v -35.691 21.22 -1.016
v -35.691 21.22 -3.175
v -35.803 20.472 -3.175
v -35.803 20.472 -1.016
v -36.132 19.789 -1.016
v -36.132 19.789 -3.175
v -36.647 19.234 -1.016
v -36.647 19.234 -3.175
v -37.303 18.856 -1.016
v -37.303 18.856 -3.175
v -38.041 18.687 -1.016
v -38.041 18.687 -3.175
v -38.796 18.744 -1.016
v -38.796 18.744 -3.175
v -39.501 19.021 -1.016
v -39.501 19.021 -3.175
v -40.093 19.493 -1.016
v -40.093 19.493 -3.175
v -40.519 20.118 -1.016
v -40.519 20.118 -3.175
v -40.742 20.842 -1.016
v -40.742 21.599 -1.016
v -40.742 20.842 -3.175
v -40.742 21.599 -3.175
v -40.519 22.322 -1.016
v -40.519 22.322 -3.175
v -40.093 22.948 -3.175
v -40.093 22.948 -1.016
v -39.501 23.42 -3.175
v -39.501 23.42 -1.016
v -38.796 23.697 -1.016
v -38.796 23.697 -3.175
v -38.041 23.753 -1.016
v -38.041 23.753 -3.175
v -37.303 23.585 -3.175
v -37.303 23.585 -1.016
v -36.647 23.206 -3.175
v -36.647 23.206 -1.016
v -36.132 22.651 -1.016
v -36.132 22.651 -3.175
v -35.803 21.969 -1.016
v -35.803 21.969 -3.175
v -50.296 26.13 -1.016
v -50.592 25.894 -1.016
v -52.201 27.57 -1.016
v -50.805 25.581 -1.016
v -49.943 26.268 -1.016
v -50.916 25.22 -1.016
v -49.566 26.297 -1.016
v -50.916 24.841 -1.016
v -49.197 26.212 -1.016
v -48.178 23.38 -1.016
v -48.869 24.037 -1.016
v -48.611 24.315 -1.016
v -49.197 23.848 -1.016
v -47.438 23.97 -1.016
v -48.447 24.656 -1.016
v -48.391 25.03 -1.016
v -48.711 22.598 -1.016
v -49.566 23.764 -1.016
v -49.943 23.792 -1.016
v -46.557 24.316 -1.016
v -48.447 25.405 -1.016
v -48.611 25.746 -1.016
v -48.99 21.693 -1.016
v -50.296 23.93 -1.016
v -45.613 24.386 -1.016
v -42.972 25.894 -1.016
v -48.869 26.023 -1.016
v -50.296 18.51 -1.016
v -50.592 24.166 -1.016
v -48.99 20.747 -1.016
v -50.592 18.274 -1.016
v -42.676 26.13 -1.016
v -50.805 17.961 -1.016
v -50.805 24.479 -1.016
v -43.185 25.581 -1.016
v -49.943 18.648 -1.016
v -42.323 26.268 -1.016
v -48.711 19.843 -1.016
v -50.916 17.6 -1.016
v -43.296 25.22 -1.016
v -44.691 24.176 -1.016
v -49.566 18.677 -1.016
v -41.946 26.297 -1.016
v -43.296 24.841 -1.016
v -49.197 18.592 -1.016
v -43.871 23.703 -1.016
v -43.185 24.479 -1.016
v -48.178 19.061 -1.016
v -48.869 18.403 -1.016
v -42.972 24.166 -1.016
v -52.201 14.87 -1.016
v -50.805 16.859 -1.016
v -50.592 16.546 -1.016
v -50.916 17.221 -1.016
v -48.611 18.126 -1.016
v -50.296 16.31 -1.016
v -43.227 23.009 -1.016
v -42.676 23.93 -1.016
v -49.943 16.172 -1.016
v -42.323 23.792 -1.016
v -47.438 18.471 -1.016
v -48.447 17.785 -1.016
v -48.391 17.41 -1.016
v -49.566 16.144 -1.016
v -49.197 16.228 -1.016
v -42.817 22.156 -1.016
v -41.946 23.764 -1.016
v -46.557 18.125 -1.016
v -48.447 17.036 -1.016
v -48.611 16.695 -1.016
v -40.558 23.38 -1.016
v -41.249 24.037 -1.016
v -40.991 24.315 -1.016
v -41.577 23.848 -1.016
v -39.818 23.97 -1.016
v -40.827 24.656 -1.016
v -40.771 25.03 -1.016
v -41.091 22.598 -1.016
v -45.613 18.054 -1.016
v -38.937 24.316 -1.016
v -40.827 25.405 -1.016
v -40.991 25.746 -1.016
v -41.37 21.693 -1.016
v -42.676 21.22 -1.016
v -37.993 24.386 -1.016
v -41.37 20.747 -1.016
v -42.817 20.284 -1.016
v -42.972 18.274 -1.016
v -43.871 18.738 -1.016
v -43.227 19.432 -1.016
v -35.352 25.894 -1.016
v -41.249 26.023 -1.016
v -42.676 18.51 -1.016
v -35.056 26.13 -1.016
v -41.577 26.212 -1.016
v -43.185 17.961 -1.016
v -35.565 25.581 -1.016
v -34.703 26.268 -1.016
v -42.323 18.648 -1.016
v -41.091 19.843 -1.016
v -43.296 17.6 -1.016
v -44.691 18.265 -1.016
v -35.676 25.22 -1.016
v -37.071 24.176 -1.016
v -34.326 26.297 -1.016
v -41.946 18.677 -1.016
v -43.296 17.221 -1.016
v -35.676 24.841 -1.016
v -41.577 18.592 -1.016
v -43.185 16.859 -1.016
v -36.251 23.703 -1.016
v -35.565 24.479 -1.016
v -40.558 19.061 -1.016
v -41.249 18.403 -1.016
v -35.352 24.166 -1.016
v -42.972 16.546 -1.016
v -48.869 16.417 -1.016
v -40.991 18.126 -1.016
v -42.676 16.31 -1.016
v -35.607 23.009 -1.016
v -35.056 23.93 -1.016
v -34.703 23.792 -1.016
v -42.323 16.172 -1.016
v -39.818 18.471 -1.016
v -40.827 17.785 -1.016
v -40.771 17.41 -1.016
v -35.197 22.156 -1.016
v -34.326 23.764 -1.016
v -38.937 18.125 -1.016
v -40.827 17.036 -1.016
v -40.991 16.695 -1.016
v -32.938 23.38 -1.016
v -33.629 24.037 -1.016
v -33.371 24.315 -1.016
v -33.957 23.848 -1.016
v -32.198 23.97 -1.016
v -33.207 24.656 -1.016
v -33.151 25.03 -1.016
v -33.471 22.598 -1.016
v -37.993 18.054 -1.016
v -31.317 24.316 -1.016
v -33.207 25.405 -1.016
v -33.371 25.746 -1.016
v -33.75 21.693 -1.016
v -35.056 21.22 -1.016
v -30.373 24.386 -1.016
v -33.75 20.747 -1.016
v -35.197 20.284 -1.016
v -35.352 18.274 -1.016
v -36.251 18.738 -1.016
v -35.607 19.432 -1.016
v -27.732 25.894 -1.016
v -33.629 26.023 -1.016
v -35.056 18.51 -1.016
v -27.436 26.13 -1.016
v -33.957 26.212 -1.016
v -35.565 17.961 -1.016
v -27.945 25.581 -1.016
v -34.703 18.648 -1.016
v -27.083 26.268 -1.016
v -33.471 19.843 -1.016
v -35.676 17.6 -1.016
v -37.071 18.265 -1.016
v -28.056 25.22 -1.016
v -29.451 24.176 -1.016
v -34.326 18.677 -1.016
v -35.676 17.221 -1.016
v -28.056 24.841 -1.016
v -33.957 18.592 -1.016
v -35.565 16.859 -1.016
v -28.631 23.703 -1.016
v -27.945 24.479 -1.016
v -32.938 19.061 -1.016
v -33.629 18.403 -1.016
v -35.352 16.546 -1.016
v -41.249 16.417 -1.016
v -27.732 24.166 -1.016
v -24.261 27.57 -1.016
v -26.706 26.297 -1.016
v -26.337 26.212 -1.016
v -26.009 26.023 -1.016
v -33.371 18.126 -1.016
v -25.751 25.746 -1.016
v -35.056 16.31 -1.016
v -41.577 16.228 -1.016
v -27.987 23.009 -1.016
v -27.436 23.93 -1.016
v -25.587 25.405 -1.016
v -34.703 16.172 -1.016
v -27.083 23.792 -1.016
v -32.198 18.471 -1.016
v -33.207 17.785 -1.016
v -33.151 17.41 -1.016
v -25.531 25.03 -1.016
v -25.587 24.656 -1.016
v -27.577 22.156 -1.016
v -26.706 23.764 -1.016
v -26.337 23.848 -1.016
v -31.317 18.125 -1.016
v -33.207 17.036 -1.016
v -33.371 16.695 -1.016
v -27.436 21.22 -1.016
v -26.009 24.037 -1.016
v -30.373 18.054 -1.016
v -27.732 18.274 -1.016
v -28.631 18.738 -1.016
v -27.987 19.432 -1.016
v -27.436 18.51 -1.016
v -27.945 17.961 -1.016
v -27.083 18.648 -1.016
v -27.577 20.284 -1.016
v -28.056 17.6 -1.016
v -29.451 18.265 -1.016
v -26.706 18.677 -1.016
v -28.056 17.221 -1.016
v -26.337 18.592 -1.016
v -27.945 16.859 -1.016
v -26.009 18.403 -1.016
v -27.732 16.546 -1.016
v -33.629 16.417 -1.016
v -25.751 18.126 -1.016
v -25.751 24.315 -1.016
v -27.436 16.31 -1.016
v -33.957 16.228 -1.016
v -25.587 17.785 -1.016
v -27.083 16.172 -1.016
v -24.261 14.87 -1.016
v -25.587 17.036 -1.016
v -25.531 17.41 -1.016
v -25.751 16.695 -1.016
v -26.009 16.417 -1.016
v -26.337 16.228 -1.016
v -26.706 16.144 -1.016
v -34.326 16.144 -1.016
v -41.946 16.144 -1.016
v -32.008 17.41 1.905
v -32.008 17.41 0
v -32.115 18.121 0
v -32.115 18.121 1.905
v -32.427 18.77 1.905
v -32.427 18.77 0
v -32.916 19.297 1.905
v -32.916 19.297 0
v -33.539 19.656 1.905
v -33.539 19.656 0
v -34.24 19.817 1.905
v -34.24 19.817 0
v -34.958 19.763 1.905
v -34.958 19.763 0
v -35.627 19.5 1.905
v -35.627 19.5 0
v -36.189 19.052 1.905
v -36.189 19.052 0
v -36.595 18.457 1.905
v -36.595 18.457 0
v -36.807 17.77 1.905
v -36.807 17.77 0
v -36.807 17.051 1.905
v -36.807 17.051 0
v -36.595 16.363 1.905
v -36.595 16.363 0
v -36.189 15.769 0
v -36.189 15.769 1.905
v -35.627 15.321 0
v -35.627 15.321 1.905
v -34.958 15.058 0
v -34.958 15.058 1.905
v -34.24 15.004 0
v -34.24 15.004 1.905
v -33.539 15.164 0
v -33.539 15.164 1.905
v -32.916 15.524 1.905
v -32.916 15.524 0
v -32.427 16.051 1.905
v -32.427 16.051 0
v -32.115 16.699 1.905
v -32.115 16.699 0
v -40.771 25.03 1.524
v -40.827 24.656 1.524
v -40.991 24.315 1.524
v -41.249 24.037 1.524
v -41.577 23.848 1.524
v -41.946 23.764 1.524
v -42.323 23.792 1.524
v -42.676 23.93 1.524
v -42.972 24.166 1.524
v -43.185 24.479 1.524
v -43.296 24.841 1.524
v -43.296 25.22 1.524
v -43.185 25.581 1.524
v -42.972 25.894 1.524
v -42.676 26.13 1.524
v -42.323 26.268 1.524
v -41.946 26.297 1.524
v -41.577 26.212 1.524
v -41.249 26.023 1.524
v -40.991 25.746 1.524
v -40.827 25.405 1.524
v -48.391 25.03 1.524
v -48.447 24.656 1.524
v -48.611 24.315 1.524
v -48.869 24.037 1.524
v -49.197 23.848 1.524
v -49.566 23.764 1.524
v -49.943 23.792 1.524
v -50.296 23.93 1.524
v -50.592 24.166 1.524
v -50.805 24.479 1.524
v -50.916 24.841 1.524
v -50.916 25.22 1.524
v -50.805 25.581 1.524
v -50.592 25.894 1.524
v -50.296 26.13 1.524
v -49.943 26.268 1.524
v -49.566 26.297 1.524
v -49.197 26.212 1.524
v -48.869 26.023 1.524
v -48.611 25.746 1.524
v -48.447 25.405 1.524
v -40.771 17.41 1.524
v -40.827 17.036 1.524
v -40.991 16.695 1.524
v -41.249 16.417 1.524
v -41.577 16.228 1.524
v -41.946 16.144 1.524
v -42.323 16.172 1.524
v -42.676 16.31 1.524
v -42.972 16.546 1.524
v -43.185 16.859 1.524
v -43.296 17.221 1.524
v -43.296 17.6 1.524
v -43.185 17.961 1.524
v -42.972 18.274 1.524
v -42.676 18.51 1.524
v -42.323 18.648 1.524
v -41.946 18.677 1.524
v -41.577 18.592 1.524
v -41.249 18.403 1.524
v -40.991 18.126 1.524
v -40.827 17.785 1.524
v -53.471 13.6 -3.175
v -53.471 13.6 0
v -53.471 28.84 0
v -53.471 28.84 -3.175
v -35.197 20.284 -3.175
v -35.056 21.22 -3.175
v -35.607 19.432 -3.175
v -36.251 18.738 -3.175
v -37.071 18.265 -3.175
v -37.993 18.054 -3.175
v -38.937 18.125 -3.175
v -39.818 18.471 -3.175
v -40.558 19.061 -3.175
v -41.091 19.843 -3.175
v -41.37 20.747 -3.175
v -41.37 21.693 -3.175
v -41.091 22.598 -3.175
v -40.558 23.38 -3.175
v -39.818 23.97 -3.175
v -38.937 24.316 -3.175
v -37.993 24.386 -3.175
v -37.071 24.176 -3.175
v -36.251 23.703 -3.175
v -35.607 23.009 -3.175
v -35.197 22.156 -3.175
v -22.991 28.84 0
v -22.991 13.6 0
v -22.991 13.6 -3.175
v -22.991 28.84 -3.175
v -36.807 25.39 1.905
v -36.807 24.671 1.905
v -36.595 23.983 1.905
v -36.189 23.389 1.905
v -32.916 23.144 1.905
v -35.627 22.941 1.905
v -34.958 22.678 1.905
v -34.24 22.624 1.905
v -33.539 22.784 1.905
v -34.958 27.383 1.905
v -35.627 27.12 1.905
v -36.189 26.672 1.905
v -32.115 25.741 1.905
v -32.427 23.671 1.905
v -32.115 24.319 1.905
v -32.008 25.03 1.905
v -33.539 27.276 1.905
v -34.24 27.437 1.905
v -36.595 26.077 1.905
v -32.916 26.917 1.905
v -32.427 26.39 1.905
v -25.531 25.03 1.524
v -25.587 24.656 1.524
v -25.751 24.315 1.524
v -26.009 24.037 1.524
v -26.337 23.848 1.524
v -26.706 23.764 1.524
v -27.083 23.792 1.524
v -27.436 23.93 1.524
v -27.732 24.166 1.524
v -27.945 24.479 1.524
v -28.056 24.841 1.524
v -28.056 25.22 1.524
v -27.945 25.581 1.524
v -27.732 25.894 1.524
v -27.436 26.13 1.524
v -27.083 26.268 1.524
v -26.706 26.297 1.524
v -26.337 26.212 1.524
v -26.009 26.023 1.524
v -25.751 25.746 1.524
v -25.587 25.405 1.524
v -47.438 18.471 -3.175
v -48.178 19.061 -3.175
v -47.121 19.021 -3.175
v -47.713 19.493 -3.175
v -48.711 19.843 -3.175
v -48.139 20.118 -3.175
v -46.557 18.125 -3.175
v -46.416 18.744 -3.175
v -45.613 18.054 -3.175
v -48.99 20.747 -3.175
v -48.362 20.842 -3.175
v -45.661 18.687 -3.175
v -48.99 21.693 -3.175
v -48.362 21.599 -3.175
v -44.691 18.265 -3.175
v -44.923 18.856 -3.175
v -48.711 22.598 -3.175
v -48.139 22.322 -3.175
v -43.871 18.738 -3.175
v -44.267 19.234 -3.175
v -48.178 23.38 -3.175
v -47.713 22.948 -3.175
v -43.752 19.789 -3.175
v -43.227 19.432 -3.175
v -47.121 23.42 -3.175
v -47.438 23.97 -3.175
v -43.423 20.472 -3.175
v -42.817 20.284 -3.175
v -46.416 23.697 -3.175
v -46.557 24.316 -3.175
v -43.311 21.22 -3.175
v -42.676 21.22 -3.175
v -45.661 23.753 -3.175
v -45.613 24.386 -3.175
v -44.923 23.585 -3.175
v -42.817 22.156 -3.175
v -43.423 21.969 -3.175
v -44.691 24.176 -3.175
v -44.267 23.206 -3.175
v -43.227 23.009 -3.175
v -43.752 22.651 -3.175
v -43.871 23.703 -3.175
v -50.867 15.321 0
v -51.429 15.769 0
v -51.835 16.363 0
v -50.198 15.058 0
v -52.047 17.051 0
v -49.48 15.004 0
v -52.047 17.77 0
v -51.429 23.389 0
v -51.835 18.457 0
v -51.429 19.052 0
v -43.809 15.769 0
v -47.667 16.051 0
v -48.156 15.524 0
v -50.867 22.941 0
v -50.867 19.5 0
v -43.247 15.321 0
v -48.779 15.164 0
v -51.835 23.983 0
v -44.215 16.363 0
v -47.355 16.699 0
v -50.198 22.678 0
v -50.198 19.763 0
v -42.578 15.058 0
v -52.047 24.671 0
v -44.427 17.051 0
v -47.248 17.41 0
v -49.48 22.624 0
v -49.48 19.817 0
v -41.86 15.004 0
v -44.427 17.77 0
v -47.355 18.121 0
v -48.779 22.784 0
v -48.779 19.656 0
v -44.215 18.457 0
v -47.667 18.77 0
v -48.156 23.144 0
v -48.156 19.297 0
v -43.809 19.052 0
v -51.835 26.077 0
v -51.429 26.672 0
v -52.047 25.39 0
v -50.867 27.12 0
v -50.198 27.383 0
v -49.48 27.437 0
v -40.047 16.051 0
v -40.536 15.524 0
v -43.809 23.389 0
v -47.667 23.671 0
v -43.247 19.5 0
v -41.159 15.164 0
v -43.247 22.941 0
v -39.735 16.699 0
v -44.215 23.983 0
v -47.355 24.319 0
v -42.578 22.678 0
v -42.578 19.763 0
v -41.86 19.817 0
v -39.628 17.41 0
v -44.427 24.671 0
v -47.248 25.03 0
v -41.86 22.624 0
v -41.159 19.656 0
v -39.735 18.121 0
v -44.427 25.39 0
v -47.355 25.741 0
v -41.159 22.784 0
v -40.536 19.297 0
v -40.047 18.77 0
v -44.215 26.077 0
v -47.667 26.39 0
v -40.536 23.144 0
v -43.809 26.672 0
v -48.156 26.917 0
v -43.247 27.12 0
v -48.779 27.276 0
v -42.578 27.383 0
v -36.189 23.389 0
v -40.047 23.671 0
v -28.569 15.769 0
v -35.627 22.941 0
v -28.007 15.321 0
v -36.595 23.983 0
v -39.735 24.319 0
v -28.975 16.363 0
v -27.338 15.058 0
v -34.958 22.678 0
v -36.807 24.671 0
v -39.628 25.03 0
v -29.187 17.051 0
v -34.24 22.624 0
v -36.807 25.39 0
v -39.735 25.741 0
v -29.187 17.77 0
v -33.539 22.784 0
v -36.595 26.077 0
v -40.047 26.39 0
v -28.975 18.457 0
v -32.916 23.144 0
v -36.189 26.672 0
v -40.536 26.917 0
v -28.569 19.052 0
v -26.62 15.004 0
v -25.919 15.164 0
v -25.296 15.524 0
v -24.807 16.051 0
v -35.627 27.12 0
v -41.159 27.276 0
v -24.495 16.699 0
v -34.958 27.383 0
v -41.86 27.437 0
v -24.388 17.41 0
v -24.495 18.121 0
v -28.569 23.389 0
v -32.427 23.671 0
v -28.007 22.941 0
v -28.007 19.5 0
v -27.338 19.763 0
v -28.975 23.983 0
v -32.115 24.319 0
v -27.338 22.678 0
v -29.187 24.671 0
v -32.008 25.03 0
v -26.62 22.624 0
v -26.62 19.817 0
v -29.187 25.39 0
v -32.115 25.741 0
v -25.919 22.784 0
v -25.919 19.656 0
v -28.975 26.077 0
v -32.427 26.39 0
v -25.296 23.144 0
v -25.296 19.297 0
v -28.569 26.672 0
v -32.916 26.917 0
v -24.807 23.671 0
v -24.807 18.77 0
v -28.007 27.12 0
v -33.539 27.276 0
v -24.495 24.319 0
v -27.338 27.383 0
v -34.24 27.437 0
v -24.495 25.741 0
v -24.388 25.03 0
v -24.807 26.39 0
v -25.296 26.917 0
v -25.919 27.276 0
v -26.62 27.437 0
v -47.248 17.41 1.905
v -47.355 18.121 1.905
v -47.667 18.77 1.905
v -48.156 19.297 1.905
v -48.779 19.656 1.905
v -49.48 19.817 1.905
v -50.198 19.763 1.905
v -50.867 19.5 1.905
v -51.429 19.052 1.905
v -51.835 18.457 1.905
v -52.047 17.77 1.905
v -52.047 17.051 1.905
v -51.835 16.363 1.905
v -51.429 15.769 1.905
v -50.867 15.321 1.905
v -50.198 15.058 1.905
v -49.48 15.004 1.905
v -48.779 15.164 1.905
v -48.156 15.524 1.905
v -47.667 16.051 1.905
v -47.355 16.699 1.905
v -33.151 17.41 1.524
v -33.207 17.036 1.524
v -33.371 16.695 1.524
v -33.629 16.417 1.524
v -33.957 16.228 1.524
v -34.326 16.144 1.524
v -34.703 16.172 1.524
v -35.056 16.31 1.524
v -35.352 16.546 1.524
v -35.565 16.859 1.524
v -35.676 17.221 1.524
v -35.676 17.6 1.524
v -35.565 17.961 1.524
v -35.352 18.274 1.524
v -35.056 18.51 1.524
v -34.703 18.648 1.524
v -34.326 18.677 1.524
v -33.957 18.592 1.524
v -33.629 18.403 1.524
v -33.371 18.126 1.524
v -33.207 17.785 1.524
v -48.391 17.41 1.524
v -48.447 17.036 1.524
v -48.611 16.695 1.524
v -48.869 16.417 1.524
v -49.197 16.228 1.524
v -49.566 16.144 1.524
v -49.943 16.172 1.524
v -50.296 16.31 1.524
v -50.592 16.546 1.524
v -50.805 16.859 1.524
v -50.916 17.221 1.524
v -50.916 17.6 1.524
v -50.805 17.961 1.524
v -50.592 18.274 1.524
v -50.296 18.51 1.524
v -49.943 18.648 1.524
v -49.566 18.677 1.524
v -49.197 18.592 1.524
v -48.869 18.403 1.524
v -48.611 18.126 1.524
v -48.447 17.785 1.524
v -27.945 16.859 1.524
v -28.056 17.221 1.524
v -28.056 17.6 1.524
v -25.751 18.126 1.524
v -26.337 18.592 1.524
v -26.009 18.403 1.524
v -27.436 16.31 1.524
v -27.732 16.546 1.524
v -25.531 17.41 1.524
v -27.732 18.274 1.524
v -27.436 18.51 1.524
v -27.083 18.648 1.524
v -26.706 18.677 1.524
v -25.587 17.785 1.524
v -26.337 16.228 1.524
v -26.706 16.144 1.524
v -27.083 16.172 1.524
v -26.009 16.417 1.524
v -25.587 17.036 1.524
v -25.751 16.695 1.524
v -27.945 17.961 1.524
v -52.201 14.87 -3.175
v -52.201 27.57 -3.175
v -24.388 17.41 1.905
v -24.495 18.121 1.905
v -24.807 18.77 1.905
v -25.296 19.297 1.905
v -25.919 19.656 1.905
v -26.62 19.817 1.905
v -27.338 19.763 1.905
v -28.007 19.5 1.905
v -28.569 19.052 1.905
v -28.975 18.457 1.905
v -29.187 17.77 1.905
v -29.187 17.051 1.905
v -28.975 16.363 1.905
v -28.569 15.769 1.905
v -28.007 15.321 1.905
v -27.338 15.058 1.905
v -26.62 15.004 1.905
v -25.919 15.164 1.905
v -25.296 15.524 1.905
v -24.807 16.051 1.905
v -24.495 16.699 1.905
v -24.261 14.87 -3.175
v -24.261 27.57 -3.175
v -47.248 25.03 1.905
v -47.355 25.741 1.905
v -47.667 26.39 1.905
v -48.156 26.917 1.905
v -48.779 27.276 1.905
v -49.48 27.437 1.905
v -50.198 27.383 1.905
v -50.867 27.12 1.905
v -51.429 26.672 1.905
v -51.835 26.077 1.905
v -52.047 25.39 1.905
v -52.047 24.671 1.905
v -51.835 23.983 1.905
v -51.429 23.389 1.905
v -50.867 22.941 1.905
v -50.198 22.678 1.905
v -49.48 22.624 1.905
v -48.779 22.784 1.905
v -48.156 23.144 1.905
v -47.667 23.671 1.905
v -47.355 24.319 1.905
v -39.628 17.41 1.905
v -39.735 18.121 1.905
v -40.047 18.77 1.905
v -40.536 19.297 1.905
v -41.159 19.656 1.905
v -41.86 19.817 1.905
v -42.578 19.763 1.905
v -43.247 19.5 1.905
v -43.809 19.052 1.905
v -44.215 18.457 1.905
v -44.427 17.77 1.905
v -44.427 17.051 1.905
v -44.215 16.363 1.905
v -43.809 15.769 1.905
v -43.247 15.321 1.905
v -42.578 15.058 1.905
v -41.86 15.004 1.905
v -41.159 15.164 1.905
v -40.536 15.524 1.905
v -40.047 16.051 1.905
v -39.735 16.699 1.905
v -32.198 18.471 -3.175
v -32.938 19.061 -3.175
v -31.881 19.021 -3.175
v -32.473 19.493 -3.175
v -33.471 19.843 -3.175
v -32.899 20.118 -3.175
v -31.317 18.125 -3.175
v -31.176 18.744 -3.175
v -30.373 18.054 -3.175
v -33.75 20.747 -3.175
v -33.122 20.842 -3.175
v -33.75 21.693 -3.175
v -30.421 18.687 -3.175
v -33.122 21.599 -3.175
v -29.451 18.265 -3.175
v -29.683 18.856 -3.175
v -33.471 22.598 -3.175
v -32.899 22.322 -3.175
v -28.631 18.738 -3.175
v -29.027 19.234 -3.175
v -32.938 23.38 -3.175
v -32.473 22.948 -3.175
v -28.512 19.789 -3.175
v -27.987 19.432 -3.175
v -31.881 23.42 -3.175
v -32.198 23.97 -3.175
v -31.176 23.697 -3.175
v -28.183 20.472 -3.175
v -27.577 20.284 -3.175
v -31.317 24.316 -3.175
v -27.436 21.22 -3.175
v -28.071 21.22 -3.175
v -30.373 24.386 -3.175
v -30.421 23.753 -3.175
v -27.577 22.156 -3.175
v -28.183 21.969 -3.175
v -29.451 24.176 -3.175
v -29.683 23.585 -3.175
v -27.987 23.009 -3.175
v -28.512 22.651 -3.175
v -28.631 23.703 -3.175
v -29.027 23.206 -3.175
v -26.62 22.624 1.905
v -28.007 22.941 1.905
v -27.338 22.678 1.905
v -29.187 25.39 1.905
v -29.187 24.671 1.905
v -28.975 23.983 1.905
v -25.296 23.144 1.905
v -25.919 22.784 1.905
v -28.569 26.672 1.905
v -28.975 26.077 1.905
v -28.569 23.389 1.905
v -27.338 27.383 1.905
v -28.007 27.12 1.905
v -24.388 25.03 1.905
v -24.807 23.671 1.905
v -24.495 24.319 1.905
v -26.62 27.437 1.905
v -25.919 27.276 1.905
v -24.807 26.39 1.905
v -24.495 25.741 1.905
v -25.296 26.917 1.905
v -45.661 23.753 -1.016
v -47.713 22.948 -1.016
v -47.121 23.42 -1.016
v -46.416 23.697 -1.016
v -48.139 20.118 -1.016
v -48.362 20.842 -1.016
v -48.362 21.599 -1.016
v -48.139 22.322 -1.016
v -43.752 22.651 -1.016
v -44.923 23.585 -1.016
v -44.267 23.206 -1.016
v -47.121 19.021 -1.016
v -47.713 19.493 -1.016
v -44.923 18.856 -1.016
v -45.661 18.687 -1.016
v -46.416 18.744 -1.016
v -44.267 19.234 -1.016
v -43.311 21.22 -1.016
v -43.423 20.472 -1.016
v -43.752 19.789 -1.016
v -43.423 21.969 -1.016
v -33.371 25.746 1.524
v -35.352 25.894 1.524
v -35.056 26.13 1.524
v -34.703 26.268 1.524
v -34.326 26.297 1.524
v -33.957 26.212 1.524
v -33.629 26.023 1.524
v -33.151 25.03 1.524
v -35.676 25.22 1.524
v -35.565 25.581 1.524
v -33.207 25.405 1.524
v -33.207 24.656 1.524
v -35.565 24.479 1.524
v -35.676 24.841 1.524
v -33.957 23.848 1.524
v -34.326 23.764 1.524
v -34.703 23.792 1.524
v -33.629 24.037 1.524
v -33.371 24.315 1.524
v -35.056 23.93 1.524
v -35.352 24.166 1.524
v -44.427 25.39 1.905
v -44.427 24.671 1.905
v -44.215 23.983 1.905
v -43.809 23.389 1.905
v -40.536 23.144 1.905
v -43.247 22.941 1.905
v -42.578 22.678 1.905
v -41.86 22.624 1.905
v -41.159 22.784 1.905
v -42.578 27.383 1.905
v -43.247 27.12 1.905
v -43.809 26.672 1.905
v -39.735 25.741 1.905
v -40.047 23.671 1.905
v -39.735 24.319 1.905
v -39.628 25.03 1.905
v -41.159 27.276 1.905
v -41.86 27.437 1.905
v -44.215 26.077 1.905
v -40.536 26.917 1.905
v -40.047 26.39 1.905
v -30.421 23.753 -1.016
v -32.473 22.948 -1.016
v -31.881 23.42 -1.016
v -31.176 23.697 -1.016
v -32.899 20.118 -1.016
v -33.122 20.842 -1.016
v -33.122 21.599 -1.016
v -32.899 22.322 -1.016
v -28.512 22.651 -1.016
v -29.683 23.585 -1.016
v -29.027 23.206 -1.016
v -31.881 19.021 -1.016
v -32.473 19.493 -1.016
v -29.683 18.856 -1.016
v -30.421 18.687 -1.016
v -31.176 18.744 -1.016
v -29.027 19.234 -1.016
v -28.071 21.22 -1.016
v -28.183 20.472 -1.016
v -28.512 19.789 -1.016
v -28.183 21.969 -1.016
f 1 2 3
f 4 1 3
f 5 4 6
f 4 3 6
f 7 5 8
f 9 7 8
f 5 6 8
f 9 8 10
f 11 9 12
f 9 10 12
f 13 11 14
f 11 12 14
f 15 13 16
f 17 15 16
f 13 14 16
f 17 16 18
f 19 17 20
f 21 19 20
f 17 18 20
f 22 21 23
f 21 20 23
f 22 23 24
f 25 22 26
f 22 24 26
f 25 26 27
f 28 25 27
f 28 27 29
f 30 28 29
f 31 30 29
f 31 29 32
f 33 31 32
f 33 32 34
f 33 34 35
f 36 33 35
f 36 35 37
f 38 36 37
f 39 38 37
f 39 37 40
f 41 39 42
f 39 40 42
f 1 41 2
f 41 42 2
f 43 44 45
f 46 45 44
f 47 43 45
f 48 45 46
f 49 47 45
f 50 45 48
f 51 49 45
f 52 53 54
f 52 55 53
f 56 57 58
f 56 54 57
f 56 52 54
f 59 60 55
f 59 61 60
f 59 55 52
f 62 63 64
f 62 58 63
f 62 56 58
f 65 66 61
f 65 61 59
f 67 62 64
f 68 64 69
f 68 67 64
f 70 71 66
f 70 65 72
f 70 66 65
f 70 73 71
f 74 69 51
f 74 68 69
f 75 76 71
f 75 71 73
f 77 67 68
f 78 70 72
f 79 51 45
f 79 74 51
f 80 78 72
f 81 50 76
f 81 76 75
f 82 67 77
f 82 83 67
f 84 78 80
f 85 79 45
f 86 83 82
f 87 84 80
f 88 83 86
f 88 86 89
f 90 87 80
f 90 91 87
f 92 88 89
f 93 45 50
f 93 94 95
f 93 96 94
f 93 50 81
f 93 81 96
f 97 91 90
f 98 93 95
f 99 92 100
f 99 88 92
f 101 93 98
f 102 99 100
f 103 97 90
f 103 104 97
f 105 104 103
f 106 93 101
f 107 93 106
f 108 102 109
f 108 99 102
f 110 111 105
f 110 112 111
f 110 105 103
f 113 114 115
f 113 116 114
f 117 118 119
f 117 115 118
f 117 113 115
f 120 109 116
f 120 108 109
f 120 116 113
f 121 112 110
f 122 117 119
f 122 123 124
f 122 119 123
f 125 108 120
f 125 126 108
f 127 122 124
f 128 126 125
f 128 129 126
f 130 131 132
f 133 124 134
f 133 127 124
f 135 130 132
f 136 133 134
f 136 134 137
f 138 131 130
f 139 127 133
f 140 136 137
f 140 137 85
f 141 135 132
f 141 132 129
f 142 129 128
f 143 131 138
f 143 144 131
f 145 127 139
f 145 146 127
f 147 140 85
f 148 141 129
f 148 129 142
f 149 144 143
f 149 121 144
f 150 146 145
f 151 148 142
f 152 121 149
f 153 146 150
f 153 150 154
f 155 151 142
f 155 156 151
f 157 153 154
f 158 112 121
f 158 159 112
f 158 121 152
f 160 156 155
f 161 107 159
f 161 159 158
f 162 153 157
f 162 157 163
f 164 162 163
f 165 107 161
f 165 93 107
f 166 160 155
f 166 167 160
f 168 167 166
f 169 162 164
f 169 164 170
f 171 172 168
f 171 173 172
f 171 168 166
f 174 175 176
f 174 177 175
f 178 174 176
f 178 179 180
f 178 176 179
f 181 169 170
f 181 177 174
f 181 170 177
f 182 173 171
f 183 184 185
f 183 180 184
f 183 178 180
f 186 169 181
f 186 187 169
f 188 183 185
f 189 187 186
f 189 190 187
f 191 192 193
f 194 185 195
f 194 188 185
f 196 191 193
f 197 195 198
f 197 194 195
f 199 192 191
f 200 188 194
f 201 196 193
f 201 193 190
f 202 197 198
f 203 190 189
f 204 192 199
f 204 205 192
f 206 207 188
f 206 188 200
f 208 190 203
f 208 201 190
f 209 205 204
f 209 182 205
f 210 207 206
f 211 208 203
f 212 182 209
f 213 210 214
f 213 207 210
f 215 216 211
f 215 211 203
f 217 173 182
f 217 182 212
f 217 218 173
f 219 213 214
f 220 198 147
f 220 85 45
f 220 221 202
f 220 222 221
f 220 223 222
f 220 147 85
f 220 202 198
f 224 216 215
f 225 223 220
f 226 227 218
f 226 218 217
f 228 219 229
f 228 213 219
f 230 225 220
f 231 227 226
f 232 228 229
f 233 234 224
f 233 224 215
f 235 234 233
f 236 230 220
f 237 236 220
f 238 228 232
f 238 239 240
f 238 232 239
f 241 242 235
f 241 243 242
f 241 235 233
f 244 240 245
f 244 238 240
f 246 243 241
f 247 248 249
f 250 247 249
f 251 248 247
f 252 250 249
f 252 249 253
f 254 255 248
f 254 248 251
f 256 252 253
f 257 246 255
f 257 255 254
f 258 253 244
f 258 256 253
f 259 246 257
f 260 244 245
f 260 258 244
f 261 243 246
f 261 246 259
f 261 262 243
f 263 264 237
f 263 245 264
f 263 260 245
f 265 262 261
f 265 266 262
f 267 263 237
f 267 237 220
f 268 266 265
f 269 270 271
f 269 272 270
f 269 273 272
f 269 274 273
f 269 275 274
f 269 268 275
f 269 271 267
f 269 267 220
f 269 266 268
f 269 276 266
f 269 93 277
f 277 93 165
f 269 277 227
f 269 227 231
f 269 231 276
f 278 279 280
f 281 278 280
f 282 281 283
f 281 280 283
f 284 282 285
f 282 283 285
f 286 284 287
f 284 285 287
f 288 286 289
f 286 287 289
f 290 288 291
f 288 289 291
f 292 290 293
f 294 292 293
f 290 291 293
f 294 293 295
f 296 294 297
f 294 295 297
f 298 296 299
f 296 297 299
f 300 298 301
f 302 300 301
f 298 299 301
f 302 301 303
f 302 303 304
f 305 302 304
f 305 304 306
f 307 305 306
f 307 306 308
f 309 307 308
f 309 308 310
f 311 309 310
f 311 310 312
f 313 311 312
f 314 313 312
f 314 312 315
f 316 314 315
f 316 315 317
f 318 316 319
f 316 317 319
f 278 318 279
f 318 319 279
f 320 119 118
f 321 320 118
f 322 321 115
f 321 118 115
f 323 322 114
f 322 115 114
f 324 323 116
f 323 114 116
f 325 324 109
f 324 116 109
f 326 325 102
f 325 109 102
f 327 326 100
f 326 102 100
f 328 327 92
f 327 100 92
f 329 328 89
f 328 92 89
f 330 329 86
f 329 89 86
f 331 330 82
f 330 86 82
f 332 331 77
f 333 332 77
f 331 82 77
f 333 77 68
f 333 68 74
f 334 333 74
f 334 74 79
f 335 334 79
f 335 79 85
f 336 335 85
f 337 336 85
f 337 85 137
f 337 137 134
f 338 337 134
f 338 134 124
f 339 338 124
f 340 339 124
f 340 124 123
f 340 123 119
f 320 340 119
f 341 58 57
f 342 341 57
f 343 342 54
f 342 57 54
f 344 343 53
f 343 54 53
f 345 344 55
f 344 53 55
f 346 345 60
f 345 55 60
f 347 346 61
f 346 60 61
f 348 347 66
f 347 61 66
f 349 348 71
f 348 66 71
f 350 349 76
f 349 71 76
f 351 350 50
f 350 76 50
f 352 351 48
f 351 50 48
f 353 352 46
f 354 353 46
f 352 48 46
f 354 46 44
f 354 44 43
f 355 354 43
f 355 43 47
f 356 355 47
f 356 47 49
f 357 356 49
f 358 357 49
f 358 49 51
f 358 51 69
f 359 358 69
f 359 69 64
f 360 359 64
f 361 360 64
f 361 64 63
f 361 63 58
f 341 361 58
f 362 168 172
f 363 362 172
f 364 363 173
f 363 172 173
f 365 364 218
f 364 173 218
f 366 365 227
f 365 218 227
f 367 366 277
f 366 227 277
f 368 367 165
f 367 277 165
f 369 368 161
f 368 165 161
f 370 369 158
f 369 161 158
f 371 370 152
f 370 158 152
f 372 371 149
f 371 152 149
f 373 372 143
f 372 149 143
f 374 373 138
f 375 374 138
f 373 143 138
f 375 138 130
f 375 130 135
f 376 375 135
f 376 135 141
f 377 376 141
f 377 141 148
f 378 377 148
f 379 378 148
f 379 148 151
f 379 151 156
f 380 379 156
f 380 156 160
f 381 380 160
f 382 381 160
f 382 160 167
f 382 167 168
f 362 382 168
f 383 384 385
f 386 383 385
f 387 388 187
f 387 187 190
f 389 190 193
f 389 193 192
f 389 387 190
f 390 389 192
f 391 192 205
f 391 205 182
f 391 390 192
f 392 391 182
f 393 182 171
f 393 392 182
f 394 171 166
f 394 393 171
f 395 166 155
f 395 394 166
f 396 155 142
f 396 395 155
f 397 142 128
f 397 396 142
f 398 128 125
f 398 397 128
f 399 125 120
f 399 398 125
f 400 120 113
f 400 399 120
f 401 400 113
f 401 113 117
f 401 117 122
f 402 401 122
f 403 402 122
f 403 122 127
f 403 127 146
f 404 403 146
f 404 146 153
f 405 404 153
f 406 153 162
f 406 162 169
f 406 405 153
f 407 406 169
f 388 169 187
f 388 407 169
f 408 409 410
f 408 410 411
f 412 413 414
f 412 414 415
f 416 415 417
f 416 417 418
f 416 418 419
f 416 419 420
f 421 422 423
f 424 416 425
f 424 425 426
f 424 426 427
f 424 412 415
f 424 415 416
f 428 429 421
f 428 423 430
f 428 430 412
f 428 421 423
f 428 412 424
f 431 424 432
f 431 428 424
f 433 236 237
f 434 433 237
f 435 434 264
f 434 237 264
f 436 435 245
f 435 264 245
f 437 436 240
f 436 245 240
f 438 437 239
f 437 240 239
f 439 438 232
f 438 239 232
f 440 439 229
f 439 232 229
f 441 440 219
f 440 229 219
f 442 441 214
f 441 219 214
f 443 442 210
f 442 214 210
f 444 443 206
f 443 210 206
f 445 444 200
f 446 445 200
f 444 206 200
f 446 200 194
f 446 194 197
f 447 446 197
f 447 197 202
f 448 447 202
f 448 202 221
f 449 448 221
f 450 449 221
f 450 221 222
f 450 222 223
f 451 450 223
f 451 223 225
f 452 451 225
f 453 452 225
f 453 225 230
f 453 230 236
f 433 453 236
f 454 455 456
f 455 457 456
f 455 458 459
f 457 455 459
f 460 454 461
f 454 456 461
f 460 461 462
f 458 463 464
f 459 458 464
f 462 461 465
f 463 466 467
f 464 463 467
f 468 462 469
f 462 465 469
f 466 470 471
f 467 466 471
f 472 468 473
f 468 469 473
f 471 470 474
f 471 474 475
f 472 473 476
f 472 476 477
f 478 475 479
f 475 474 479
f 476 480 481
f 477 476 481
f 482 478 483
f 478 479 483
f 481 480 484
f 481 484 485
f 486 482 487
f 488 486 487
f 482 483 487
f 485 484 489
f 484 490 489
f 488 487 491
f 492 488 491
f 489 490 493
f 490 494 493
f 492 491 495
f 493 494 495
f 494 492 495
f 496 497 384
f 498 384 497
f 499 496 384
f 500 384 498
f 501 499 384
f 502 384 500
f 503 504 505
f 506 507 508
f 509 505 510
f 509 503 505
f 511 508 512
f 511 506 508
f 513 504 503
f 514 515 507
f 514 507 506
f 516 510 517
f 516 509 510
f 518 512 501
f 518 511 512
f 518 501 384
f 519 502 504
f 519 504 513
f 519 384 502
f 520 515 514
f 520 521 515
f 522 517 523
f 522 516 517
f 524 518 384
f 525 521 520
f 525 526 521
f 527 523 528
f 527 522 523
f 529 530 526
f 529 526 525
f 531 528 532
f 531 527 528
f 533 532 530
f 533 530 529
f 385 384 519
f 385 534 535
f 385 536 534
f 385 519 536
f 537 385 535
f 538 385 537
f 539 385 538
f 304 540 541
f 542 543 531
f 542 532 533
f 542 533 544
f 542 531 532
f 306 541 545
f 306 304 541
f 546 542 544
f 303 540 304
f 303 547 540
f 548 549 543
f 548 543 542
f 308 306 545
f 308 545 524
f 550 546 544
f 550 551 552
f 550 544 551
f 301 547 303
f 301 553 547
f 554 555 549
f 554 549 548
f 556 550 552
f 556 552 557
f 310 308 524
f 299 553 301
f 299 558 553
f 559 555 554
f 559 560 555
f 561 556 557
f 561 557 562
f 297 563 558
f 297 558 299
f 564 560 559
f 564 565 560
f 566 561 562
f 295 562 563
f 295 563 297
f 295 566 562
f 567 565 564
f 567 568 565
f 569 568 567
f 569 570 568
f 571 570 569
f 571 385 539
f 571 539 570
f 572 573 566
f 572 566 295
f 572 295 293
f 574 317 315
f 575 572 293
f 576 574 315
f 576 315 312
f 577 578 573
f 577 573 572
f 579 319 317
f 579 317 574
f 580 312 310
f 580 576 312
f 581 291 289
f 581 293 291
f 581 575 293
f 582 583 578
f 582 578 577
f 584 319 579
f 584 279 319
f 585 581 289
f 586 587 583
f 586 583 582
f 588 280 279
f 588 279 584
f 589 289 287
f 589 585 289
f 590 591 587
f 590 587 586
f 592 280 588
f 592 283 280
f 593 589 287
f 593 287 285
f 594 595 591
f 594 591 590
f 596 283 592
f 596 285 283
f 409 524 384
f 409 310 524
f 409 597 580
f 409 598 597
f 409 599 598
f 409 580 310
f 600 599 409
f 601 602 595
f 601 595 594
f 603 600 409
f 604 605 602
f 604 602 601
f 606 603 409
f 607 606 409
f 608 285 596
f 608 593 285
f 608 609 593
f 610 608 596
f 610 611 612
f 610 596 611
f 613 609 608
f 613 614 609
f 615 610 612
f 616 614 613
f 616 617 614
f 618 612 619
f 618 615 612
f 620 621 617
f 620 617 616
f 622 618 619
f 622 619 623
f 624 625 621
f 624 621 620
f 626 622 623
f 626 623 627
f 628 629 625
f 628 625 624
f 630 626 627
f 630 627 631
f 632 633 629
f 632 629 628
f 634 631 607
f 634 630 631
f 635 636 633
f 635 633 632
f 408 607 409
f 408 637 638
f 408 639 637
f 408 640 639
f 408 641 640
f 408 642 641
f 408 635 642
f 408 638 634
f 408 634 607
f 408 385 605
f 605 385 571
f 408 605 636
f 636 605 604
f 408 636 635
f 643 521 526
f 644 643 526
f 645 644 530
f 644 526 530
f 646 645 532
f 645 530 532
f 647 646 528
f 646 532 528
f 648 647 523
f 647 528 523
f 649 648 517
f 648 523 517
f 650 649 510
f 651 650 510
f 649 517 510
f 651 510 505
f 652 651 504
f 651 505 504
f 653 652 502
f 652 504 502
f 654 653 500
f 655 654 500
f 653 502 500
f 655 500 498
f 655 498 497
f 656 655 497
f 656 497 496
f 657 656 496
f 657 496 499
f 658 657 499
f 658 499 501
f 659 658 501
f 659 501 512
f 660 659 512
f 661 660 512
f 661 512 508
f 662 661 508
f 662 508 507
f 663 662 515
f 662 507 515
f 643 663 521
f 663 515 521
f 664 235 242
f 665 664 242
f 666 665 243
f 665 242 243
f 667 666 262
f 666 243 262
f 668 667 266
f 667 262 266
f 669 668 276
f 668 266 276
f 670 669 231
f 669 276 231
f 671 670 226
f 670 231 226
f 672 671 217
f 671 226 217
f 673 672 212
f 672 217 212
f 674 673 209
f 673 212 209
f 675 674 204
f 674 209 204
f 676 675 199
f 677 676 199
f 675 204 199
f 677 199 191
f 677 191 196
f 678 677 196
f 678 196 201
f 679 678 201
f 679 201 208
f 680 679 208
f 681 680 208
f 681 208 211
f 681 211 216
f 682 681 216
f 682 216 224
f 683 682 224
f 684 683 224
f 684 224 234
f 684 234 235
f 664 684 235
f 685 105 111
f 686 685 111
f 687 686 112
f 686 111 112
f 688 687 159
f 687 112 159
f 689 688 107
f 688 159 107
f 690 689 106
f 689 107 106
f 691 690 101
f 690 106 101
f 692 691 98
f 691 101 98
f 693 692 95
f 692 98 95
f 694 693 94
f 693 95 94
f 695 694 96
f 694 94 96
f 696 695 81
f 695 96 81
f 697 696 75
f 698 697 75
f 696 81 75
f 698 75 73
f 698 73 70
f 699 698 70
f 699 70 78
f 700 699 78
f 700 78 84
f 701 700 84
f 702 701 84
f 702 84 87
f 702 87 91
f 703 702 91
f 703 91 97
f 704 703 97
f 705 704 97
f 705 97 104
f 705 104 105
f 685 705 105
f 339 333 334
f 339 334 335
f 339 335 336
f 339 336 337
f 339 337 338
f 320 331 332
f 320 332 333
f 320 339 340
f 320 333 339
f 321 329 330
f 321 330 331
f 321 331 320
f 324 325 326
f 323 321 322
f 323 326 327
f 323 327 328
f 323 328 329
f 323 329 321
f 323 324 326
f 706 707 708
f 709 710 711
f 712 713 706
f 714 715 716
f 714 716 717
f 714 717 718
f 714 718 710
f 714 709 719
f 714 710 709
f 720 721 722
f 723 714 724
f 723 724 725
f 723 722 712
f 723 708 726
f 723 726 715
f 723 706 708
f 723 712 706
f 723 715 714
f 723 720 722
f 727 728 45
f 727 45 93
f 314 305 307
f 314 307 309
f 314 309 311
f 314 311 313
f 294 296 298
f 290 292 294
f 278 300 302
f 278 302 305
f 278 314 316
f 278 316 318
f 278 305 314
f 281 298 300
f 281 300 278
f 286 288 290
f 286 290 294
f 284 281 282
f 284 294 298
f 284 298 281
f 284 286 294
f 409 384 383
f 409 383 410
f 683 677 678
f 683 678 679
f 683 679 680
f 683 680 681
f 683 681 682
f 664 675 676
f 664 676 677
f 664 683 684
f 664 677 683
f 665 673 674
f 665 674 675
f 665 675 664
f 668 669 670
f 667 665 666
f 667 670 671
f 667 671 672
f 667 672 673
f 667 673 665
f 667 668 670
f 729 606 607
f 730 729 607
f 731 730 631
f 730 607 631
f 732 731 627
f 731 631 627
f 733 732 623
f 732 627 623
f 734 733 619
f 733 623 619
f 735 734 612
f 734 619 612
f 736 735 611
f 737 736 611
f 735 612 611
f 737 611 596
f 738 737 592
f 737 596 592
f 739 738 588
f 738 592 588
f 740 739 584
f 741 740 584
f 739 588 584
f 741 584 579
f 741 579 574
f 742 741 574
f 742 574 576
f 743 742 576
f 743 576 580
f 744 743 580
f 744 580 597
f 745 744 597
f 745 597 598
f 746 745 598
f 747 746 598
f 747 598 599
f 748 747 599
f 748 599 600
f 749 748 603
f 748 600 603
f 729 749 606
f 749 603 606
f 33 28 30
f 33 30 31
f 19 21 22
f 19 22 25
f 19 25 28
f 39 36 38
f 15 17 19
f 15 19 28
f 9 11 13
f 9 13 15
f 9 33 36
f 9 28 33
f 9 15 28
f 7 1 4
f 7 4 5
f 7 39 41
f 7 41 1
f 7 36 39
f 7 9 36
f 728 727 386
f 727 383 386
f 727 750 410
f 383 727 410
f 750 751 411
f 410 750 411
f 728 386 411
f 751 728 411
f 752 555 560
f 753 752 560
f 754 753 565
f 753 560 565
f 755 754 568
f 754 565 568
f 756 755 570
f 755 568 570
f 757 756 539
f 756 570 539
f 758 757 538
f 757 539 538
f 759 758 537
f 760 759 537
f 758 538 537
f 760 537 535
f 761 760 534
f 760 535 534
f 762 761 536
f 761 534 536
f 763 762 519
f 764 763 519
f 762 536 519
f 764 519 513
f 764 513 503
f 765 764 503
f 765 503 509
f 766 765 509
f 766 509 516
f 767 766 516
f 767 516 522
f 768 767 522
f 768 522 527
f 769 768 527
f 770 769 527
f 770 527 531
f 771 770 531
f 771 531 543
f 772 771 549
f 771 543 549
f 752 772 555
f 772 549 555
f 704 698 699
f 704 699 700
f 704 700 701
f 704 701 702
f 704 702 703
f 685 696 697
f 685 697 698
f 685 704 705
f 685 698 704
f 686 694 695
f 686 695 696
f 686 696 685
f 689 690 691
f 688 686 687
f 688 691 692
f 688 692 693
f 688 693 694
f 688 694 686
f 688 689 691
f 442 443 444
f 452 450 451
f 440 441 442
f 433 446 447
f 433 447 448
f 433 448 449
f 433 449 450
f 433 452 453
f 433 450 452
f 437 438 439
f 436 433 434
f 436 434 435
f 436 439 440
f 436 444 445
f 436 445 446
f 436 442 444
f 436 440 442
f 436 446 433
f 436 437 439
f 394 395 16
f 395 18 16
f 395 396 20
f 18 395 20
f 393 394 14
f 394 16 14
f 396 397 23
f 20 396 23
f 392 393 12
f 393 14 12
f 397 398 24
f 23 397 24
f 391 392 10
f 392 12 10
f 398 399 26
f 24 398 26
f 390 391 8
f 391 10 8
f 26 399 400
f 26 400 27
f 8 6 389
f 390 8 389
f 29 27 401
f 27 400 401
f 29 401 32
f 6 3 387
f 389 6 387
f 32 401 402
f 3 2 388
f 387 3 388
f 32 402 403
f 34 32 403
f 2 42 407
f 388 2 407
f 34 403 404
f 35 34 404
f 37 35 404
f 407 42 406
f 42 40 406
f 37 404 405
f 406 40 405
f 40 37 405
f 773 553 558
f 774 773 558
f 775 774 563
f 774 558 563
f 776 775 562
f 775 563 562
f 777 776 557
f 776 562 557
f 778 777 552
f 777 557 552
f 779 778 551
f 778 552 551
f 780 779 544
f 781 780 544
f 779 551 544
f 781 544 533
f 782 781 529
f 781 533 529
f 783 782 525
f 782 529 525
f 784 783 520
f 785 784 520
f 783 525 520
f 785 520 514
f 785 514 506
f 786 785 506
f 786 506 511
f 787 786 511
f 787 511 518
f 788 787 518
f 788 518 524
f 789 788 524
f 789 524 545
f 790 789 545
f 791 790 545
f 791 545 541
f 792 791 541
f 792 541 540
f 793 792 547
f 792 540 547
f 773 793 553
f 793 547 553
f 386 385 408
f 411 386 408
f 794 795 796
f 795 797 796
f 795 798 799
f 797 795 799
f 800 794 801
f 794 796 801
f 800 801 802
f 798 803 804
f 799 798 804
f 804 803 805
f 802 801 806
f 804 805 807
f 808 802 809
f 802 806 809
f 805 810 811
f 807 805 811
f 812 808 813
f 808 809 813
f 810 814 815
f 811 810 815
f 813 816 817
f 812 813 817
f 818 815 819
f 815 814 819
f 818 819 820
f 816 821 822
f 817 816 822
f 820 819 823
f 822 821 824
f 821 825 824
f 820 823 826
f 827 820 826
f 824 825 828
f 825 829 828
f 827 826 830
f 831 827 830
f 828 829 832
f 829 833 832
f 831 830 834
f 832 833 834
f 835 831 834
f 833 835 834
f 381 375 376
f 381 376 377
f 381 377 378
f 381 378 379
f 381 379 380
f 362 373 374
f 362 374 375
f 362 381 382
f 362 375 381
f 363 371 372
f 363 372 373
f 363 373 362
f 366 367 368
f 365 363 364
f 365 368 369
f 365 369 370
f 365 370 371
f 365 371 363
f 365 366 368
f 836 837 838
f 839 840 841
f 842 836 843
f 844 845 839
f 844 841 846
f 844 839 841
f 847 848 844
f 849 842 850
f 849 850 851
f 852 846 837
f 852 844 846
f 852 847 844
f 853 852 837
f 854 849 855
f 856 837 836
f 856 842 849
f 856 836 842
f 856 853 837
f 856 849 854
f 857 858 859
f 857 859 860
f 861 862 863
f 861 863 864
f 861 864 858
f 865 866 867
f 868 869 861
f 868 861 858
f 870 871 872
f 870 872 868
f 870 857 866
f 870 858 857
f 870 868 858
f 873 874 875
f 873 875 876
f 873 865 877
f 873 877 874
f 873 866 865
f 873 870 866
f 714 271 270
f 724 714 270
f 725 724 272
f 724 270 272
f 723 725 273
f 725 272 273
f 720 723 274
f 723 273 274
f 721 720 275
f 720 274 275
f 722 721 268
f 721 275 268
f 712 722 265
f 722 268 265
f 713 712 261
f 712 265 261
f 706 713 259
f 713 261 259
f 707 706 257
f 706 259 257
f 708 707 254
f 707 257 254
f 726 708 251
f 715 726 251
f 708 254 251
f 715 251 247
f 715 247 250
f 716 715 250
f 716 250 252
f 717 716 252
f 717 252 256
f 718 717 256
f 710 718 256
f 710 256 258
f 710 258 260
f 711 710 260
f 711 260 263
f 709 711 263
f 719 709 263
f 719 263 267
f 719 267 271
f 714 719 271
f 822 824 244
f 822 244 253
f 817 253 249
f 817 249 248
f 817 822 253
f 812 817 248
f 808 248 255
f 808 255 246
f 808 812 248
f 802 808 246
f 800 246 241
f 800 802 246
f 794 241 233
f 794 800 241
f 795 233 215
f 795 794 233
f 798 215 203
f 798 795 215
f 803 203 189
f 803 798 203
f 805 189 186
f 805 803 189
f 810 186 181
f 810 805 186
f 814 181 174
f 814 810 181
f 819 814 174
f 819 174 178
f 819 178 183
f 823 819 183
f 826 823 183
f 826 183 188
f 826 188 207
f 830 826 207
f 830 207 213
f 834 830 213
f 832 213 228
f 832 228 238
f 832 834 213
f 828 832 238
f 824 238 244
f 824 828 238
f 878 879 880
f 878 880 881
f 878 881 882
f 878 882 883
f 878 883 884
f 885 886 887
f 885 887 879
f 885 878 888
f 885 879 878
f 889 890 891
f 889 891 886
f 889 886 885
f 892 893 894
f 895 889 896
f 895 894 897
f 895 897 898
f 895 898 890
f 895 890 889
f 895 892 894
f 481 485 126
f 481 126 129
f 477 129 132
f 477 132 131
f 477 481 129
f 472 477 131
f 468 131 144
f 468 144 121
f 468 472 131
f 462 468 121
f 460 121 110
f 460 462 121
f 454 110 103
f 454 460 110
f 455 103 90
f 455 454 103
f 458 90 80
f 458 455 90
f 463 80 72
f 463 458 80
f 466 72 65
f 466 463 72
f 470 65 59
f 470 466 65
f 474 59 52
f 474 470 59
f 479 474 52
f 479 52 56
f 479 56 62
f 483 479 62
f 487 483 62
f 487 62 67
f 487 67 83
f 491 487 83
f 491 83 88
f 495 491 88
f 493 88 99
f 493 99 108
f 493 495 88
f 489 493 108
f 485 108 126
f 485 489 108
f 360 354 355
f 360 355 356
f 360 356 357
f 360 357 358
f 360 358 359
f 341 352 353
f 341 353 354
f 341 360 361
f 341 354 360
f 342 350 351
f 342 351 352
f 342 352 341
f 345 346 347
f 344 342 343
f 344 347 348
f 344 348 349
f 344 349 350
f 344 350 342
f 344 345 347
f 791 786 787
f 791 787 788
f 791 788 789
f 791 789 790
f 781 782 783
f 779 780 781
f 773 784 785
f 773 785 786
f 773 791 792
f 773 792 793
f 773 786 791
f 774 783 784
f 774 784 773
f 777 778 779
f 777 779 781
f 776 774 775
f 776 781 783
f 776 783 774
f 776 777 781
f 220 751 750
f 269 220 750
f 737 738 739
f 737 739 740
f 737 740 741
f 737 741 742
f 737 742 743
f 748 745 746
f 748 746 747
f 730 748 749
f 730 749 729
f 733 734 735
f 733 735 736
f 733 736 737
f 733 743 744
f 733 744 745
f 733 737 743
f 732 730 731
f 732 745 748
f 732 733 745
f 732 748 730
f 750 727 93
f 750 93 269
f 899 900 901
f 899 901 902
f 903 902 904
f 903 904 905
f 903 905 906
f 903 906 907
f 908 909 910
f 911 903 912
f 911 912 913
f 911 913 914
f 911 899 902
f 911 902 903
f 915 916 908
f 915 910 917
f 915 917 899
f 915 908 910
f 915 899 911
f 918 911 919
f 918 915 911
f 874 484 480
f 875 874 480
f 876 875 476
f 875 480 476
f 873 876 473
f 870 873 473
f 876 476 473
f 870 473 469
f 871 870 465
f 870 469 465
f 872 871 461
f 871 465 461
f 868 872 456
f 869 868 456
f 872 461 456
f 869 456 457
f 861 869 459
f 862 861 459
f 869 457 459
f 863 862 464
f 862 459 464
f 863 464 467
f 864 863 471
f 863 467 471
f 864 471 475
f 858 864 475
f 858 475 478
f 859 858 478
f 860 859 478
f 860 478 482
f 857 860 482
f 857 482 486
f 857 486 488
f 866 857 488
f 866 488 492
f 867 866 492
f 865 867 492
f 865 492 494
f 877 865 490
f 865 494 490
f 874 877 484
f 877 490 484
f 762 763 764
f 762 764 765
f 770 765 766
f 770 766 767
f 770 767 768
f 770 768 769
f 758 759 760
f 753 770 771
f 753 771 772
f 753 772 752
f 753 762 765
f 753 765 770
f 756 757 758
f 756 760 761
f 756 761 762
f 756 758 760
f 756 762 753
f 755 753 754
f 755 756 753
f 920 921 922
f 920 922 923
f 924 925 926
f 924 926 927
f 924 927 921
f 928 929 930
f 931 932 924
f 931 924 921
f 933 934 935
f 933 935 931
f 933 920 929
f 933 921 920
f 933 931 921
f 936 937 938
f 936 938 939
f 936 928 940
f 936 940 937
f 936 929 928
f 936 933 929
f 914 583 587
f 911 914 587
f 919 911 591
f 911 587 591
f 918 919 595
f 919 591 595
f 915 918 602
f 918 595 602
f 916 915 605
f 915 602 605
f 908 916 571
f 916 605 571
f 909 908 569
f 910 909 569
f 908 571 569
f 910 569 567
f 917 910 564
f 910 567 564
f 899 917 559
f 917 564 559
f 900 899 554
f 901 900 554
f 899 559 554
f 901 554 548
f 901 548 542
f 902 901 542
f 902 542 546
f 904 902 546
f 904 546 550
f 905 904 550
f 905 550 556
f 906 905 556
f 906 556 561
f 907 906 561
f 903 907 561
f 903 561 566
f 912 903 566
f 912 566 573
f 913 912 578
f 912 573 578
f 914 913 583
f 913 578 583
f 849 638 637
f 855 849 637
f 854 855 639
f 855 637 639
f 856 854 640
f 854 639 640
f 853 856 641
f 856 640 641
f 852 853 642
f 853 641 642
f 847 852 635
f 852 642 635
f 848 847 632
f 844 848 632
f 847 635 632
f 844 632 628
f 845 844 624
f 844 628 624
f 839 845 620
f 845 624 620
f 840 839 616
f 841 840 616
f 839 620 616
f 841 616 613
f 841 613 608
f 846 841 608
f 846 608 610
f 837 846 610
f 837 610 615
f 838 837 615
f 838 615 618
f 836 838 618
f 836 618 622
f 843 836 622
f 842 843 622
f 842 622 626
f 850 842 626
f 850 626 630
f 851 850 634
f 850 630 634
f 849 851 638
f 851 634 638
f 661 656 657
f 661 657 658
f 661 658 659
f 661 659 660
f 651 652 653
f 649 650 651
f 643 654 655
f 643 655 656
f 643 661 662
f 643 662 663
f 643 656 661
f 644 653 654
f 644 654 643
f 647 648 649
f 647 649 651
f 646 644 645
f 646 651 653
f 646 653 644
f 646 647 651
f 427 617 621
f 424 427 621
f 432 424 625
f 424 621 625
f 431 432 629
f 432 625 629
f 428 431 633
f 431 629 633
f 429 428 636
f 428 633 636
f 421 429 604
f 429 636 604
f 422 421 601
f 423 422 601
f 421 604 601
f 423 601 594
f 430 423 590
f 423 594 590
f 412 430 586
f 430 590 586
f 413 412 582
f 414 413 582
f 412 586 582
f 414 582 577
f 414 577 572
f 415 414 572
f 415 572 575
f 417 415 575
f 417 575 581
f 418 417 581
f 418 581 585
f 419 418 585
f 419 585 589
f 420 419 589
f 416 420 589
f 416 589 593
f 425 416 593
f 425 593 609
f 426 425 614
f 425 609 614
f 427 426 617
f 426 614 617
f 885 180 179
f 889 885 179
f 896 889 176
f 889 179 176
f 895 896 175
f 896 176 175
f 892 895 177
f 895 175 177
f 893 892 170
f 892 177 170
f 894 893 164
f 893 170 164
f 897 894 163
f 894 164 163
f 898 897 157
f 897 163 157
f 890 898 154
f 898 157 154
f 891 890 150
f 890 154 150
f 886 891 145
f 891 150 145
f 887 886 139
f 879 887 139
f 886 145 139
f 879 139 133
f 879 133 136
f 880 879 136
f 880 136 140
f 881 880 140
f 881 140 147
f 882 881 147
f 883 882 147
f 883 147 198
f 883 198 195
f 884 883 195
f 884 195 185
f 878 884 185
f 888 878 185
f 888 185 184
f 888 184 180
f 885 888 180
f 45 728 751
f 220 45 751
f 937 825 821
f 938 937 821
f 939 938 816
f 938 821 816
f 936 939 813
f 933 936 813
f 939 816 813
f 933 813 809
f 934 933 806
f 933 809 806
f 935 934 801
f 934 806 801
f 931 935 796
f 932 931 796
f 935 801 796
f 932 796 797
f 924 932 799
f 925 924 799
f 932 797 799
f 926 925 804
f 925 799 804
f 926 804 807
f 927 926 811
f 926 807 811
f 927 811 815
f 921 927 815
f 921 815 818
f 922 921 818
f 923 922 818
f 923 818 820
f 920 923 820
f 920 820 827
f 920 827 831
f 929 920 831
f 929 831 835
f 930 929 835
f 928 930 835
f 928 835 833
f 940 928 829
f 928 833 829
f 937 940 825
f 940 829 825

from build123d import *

# Parameters (mm, degrees)
F0_W      = 30.48
F0_H      = 15.24
F2_DEPTH  = 3.175
F1_R      = 2.413
F3_DEPTH  = 1.905
F5_R      = 1.27
F6_DEPTH  = 4.699
F4_W      = 27.94
F4_H      = 12.7
F4_R      = 3.175
F7_DEPTH  = 2.159
F8_DEPTH  = 4.699
F9_DEPTH  = 4.699
F4_R_2    = 2.54
F10_DEPTH = 2.159
F11_DEPTH = 2.159
F12_DEPTH = 2.159


with BuildPart() as f2:
    # F0 (on Top) → F2 (new body)
    with BuildSketch(Plane.XY):
        with Locations((-38.230583, 21.220251)):
            Rectangle(F0_W, F0_H)
    extrude(amount=-F2_DEPTH)

    # F1 (on face) → F3 (join)
    with BuildSketch(Plane.XY):
        with Locations((-26.800583, 25.030251)):
            Circle(F1_R)
        with Locations((-26.800583, 17.410251)):
            Circle(F1_R)
        with Locations((-34.420583, 25.030251)):
            Circle(F1_R)
        with Locations((-34.420583, 17.410251)):
            Circle(F1_R)
        with Locations((-42.040583, 25.030251)):
            Circle(F1_R)
        with Locations((-42.040583, 17.410251)):
            Circle(F1_R)
        with Locations((-49.660583, 25.030251)):
            Circle(F1_R)
        with Locations((-49.660583, 17.410251)):
            Circle(F1_R)
    extrude(amount=F3_DEPTH)

    # F5 (on face) → F6 (cut)
    with BuildSketch(Plane(origin=(0, 0, -3.175), x_dir=(1, 0, 0), z_dir=(0, 0, -1))):
        with Locations((-26.800583, -25.030251)):
            Circle(F5_R)
        with Locations((-34.420583, -25.030251)):
            Circle(F5_R)
        with Locations((-42.040583, -25.030251)):
            Circle(F5_R)
        with Locations((-49.660583, -25.030251)):
            Circle(F5_R)
        with Locations((-26.800583, -17.410251)):
            Circle(F5_R)
        with Locations((-34.420583, -17.410251)):
            Circle(F5_R)
        with Locations((-42.040583, -17.410251)):
            Circle(F5_R)
        with Locations((-49.660583, -17.410251)):
            Circle(F5_R)
    extrude(amount=-F6_DEPTH, mode=Mode.SUBTRACT)

    # F4 (on face) → F7 (cut)
    with BuildSketch(Plane(origin=(0, 0, -3.175), x_dir=(1, 0, 0), z_dir=(0, 0, -1))):
        with Locations((-38.230583, -21.220251)):
            Rectangle(F4_W, F4_H)
        with Locations((-45.850583, -21.220251)):
            Circle(F4_R, mode=Mode.SUBTRACT)
        with Locations((-38.230583, -21.220251)):
            Circle(F4_R, mode=Mode.SUBTRACT)
        with Locations((-30.610583, -21.220251)):
            Circle(F4_R, mode=Mode.SUBTRACT)
    extrude(amount=-F7_DEPTH, mode=Mode.SUBTRACT)

    # F5 (on face) → F8 (join)
    with BuildSketch(Plane(origin=(0, 0, -3.175), x_dir=(1, 0, 0), z_dir=(0, 0, -1))):
        with Locations((-49.660583, -25.030251)):
            Circle(F5_R)
    extrude(amount=-F8_DEPTH)

    # F5 (on face) → F9 (cut)
    with BuildSketch(Plane(origin=(0, 0, -3.175), x_dir=(1, 0, 0), z_dir=(0, 0, -1))):
        with Locations((-49.660583, -25.030251)):
            Circle(F5_R)
    extrude(amount=-F9_DEPTH, mode=Mode.SUBTRACT)

    # F4 (on face) → F10 (cut)
    with BuildSketch(Plane(origin=(0, 0, -3.175), x_dir=(1, 0, 0), z_dir=(0, 0, -1))):
        with Locations((-45.850583, -21.220251)):
            Circle(F4_R_2)
    extrude(amount=-F10_DEPTH, mode=Mode.SUBTRACT)

    # F4 (on face) → F11 (cut)
    with BuildSketch(Plane(origin=(0, 0, -3.175), x_dir=(1, 0, 0), z_dir=(0, 0, -1))):
        with Locations((-30.610583, -21.220251)):
            Circle(F4_R_2)
    extrude(amount=-F11_DEPTH, mode=Mode.SUBTRACT)

    # F4 (on face) → F12 (cut)
    with BuildSketch(Plane(origin=(0, 0, -3.175), x_dir=(1, 0, 0), z_dir=(0, 0, -1))):
        with Locations((-38.230583, -21.220251)):
            Circle(F4_R_2)
    extrude(amount=-F12_DEPTH, mode=Mode.SUBTRACT)


solid = f2.part
